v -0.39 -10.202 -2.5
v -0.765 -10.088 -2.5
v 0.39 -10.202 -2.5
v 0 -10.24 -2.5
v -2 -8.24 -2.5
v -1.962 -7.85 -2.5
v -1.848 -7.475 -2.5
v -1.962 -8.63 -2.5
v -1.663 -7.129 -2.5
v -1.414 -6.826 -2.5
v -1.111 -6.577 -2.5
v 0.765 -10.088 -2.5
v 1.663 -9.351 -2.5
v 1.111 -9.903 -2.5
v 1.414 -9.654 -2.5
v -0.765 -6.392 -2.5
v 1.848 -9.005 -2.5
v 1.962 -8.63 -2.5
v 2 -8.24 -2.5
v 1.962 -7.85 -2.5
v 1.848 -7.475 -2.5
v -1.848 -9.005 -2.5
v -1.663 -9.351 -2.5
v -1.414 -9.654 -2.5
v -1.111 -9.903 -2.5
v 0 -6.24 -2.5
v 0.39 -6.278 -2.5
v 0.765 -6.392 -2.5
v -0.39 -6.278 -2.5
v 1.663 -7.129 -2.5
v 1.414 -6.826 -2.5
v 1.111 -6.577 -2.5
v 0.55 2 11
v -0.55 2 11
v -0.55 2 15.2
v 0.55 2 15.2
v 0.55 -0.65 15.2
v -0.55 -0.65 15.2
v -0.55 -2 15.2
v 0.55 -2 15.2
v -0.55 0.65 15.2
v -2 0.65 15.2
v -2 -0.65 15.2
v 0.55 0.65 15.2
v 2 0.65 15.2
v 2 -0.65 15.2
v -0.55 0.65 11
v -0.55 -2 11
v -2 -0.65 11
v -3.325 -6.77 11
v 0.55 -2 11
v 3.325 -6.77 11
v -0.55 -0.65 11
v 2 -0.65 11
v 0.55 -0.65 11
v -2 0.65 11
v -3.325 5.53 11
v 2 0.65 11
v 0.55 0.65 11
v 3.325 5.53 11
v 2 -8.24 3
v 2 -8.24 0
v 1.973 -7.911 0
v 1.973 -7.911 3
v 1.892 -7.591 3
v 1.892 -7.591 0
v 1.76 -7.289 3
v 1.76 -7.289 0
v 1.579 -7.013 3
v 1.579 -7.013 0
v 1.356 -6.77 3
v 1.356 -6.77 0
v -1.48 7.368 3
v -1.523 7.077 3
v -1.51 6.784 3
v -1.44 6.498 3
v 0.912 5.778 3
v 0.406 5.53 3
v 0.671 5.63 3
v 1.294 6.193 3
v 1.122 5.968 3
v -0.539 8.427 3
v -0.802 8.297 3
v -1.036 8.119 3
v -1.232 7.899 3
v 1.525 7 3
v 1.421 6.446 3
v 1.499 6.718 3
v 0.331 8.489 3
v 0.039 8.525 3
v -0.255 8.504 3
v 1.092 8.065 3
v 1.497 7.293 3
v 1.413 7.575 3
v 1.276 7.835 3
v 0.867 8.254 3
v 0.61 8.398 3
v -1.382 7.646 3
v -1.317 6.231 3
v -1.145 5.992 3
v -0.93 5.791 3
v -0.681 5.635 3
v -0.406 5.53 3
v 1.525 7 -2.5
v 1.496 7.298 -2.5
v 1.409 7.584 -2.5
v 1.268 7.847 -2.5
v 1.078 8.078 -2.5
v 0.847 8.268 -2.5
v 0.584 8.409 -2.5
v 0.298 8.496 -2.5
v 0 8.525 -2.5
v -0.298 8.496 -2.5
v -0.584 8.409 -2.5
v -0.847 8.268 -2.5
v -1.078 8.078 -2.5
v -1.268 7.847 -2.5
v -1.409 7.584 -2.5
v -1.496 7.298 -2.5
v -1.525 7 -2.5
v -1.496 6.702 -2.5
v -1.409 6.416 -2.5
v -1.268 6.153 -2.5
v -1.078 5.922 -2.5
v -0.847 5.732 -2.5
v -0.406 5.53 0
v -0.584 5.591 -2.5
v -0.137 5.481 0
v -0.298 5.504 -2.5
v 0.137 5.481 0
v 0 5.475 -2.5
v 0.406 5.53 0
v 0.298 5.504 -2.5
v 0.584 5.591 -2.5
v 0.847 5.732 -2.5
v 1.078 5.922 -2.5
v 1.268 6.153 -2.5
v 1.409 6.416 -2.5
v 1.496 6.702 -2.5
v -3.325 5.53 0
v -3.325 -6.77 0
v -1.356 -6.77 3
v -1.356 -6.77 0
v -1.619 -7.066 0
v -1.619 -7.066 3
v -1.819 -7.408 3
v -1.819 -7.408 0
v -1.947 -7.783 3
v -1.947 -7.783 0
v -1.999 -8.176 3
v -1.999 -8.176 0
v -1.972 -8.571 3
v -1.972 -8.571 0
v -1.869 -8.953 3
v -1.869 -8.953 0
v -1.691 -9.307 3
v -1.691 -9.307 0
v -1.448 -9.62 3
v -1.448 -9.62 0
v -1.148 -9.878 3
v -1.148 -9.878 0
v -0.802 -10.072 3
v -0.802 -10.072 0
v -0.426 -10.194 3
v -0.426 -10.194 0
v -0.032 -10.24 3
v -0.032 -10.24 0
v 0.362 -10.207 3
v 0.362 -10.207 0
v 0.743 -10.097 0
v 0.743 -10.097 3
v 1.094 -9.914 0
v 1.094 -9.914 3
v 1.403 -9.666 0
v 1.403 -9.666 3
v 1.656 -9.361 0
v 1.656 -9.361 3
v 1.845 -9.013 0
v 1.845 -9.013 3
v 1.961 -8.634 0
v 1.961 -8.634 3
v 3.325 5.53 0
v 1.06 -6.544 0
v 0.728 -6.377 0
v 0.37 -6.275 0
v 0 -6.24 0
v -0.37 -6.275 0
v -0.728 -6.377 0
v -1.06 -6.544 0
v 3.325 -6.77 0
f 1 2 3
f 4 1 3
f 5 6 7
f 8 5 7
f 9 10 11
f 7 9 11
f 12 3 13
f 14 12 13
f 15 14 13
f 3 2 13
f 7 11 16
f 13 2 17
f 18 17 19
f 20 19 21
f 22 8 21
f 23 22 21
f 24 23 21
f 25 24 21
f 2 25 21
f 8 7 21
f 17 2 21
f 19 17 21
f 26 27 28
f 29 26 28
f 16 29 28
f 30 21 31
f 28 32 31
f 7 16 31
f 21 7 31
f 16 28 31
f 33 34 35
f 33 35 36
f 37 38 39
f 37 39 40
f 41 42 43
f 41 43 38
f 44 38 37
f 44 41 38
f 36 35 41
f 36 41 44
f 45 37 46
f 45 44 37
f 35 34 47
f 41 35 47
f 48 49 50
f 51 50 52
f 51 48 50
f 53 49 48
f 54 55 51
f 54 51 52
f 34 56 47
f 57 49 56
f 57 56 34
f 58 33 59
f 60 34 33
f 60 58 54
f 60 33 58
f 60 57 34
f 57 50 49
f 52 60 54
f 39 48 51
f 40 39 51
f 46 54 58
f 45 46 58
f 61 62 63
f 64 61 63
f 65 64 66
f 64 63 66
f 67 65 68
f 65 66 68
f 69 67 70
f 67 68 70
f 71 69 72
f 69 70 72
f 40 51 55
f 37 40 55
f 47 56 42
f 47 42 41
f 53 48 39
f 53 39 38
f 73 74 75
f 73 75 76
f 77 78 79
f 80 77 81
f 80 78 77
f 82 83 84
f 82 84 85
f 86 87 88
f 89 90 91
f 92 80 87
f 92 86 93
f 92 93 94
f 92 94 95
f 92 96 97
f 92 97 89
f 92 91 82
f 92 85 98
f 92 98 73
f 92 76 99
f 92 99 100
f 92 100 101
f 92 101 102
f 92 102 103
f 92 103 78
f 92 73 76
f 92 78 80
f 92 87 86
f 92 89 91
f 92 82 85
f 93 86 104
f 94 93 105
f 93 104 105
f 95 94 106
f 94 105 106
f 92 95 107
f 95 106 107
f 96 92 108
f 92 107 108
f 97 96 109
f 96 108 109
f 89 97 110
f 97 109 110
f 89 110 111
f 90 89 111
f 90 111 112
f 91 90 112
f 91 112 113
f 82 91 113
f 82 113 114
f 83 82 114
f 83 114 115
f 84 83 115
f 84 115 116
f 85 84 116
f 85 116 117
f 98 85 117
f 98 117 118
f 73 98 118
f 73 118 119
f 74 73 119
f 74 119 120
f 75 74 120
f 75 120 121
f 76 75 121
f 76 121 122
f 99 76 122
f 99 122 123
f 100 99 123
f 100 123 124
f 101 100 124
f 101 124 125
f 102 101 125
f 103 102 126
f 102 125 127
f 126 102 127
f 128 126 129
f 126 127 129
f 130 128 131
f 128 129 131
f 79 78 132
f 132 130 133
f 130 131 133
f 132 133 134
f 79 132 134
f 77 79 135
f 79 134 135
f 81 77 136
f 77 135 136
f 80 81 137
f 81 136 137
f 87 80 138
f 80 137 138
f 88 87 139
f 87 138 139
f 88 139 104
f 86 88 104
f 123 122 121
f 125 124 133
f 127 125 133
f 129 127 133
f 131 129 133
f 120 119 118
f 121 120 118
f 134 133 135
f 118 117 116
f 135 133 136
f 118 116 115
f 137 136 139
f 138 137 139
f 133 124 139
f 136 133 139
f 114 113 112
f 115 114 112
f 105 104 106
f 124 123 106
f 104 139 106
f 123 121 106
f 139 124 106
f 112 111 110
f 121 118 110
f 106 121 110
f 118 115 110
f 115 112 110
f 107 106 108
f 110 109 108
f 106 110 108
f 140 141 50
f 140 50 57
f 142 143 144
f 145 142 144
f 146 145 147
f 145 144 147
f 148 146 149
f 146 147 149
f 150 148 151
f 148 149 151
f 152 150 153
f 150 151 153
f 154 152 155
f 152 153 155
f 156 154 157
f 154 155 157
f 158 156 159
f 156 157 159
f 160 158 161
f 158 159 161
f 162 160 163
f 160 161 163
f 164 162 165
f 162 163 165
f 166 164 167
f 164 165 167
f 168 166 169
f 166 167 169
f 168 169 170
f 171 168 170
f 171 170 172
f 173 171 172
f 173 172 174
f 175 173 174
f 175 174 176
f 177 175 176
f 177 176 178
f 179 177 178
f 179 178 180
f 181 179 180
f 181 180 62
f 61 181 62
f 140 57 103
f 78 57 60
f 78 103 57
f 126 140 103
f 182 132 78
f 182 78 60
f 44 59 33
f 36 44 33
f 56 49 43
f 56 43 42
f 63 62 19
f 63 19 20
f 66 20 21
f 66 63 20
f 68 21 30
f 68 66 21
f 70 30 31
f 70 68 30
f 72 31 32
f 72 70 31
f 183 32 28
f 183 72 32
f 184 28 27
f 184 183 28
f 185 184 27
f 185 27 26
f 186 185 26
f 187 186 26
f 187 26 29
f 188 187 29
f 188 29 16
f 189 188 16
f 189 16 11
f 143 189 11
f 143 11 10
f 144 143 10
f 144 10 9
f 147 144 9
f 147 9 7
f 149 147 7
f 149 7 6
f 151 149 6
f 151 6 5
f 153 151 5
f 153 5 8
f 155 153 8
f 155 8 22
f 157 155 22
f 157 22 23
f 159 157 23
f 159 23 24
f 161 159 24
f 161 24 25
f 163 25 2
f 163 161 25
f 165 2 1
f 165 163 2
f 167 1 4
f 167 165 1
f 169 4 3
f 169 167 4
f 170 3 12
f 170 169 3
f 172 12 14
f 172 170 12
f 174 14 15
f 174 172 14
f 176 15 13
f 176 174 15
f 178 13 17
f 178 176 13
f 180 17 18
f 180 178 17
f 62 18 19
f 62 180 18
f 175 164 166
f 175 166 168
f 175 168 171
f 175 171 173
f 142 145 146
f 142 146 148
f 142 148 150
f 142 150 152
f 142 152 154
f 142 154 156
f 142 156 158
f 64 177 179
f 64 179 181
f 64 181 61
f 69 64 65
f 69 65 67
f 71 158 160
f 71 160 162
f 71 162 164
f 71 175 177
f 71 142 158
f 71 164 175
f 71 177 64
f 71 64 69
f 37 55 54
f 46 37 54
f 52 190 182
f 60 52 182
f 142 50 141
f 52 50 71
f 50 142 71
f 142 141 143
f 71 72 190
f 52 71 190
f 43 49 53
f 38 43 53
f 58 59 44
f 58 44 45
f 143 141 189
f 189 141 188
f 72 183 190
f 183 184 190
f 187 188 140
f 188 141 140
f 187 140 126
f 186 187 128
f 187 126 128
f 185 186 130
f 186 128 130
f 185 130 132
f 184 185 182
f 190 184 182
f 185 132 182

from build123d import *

# Parameters (mm, degrees)
F0_W          = 6.65
F0_H          = 12.3
F1_DEPTH      = 11
F2_R          = 1.525
F2_R_2        = 2
F3_DEPTH      = 2.5
F3_DEPTH_BACK = 3
F5_W          = 1.1
F5_H          = 1.35
F5_W_2        = 1.45
F5_H_2        = 1.3
F6_DEPTH      = 4.2


with BuildPart() as f1:
    # F0 (on Top) → F1 (new body)
    with BuildSketch(Plane.XY):
        with Locations((0, -0.62)):
            Rectangle(F0_W, F0_H)
    extrude(amount=F1_DEPTH)

    # F2 (on Top) → F3 (join, two sides)
    with BuildSketch(Plane.XY) as f3_sk:
        with Locations((0, 7)):
            Circle(F2_R)
        with Locations((0, -8.24)):
            Circle(F2_R_2)
    extrude(amount=-F3_DEPTH)
    extrude(f3_sk.sketch, amount=F3_DEPTH_BACK)

    # F5 (on face) → F6 (join, through all)
    with BuildSketch(Plane.XY.offset(11)):
        with Locations((0, 1.325)):
            Rectangle(F5_W, F5_H)
        with Locations((1.275, 0)):
            Rectangle(F5_W_2, F5_H_2)
        Rectangle(F5_W, F5_H_2)
        with Locations((-1.275, 0)):
            Rectangle(F5_W_2, F5_H_2)
        with Locations((0, -1.325)):
            Rectangle(F5_W, F5_H)
    extrude(amount=F6_DEPTH)


solid = f1.part
